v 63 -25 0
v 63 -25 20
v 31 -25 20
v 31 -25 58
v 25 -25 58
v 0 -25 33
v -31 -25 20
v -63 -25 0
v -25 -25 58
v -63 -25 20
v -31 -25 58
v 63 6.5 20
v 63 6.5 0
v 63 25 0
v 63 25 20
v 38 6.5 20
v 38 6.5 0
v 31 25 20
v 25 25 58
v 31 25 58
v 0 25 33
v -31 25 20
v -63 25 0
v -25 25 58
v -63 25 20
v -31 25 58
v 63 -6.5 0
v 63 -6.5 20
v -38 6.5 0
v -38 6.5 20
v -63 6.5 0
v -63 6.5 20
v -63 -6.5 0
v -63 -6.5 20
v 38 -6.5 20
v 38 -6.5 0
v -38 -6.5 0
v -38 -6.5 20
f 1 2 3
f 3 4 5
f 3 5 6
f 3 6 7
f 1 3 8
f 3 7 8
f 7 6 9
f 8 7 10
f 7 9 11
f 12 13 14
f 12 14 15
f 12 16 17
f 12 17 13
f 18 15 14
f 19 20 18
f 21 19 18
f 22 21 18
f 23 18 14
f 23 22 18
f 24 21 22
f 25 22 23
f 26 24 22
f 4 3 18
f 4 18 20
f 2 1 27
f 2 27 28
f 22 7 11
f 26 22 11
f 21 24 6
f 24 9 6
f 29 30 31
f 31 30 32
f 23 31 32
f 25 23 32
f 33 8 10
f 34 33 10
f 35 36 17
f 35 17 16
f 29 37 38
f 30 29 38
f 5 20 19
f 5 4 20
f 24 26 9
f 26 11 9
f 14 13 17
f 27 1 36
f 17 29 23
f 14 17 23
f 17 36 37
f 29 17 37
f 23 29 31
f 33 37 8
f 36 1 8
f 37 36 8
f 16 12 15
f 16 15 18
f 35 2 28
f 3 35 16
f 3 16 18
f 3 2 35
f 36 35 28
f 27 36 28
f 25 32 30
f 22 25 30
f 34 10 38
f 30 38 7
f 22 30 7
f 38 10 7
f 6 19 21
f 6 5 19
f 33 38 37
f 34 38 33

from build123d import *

# Parameters (mm, degrees)
F1_DEPTH = 25
F2_W     = 31.581489
F2_H     = 47.974935
F3_DEPTH = 6.5


with BuildPart() as f1:
    # F0 (on Front) → F1 (new body, symmetric)
    with BuildSketch(Plane.XZ):
        Polygon((0, 33), (0, 0), (63, 0), (63, 20), (31, 20), (31, 58), (25, 58), align=None)
    extrude(amount=F1_DEPTH, both=True)

    # F2 (on Front) → F3 (cut, symmetric)
    with BuildSketch(Plane.XZ):
        with Locations((53.790744, 10.887097)):
            Rectangle(F2_W, F2_H)
    extrude(amount=F3_DEPTH, both=True, mode=Mode.SUBTRACT)

    # F4: F1 across plane


with BuildPart() as f1_1:
    add(f1.part)
    add(f1.part.mirror(Plane.YZ))


solid = f1_1.part
